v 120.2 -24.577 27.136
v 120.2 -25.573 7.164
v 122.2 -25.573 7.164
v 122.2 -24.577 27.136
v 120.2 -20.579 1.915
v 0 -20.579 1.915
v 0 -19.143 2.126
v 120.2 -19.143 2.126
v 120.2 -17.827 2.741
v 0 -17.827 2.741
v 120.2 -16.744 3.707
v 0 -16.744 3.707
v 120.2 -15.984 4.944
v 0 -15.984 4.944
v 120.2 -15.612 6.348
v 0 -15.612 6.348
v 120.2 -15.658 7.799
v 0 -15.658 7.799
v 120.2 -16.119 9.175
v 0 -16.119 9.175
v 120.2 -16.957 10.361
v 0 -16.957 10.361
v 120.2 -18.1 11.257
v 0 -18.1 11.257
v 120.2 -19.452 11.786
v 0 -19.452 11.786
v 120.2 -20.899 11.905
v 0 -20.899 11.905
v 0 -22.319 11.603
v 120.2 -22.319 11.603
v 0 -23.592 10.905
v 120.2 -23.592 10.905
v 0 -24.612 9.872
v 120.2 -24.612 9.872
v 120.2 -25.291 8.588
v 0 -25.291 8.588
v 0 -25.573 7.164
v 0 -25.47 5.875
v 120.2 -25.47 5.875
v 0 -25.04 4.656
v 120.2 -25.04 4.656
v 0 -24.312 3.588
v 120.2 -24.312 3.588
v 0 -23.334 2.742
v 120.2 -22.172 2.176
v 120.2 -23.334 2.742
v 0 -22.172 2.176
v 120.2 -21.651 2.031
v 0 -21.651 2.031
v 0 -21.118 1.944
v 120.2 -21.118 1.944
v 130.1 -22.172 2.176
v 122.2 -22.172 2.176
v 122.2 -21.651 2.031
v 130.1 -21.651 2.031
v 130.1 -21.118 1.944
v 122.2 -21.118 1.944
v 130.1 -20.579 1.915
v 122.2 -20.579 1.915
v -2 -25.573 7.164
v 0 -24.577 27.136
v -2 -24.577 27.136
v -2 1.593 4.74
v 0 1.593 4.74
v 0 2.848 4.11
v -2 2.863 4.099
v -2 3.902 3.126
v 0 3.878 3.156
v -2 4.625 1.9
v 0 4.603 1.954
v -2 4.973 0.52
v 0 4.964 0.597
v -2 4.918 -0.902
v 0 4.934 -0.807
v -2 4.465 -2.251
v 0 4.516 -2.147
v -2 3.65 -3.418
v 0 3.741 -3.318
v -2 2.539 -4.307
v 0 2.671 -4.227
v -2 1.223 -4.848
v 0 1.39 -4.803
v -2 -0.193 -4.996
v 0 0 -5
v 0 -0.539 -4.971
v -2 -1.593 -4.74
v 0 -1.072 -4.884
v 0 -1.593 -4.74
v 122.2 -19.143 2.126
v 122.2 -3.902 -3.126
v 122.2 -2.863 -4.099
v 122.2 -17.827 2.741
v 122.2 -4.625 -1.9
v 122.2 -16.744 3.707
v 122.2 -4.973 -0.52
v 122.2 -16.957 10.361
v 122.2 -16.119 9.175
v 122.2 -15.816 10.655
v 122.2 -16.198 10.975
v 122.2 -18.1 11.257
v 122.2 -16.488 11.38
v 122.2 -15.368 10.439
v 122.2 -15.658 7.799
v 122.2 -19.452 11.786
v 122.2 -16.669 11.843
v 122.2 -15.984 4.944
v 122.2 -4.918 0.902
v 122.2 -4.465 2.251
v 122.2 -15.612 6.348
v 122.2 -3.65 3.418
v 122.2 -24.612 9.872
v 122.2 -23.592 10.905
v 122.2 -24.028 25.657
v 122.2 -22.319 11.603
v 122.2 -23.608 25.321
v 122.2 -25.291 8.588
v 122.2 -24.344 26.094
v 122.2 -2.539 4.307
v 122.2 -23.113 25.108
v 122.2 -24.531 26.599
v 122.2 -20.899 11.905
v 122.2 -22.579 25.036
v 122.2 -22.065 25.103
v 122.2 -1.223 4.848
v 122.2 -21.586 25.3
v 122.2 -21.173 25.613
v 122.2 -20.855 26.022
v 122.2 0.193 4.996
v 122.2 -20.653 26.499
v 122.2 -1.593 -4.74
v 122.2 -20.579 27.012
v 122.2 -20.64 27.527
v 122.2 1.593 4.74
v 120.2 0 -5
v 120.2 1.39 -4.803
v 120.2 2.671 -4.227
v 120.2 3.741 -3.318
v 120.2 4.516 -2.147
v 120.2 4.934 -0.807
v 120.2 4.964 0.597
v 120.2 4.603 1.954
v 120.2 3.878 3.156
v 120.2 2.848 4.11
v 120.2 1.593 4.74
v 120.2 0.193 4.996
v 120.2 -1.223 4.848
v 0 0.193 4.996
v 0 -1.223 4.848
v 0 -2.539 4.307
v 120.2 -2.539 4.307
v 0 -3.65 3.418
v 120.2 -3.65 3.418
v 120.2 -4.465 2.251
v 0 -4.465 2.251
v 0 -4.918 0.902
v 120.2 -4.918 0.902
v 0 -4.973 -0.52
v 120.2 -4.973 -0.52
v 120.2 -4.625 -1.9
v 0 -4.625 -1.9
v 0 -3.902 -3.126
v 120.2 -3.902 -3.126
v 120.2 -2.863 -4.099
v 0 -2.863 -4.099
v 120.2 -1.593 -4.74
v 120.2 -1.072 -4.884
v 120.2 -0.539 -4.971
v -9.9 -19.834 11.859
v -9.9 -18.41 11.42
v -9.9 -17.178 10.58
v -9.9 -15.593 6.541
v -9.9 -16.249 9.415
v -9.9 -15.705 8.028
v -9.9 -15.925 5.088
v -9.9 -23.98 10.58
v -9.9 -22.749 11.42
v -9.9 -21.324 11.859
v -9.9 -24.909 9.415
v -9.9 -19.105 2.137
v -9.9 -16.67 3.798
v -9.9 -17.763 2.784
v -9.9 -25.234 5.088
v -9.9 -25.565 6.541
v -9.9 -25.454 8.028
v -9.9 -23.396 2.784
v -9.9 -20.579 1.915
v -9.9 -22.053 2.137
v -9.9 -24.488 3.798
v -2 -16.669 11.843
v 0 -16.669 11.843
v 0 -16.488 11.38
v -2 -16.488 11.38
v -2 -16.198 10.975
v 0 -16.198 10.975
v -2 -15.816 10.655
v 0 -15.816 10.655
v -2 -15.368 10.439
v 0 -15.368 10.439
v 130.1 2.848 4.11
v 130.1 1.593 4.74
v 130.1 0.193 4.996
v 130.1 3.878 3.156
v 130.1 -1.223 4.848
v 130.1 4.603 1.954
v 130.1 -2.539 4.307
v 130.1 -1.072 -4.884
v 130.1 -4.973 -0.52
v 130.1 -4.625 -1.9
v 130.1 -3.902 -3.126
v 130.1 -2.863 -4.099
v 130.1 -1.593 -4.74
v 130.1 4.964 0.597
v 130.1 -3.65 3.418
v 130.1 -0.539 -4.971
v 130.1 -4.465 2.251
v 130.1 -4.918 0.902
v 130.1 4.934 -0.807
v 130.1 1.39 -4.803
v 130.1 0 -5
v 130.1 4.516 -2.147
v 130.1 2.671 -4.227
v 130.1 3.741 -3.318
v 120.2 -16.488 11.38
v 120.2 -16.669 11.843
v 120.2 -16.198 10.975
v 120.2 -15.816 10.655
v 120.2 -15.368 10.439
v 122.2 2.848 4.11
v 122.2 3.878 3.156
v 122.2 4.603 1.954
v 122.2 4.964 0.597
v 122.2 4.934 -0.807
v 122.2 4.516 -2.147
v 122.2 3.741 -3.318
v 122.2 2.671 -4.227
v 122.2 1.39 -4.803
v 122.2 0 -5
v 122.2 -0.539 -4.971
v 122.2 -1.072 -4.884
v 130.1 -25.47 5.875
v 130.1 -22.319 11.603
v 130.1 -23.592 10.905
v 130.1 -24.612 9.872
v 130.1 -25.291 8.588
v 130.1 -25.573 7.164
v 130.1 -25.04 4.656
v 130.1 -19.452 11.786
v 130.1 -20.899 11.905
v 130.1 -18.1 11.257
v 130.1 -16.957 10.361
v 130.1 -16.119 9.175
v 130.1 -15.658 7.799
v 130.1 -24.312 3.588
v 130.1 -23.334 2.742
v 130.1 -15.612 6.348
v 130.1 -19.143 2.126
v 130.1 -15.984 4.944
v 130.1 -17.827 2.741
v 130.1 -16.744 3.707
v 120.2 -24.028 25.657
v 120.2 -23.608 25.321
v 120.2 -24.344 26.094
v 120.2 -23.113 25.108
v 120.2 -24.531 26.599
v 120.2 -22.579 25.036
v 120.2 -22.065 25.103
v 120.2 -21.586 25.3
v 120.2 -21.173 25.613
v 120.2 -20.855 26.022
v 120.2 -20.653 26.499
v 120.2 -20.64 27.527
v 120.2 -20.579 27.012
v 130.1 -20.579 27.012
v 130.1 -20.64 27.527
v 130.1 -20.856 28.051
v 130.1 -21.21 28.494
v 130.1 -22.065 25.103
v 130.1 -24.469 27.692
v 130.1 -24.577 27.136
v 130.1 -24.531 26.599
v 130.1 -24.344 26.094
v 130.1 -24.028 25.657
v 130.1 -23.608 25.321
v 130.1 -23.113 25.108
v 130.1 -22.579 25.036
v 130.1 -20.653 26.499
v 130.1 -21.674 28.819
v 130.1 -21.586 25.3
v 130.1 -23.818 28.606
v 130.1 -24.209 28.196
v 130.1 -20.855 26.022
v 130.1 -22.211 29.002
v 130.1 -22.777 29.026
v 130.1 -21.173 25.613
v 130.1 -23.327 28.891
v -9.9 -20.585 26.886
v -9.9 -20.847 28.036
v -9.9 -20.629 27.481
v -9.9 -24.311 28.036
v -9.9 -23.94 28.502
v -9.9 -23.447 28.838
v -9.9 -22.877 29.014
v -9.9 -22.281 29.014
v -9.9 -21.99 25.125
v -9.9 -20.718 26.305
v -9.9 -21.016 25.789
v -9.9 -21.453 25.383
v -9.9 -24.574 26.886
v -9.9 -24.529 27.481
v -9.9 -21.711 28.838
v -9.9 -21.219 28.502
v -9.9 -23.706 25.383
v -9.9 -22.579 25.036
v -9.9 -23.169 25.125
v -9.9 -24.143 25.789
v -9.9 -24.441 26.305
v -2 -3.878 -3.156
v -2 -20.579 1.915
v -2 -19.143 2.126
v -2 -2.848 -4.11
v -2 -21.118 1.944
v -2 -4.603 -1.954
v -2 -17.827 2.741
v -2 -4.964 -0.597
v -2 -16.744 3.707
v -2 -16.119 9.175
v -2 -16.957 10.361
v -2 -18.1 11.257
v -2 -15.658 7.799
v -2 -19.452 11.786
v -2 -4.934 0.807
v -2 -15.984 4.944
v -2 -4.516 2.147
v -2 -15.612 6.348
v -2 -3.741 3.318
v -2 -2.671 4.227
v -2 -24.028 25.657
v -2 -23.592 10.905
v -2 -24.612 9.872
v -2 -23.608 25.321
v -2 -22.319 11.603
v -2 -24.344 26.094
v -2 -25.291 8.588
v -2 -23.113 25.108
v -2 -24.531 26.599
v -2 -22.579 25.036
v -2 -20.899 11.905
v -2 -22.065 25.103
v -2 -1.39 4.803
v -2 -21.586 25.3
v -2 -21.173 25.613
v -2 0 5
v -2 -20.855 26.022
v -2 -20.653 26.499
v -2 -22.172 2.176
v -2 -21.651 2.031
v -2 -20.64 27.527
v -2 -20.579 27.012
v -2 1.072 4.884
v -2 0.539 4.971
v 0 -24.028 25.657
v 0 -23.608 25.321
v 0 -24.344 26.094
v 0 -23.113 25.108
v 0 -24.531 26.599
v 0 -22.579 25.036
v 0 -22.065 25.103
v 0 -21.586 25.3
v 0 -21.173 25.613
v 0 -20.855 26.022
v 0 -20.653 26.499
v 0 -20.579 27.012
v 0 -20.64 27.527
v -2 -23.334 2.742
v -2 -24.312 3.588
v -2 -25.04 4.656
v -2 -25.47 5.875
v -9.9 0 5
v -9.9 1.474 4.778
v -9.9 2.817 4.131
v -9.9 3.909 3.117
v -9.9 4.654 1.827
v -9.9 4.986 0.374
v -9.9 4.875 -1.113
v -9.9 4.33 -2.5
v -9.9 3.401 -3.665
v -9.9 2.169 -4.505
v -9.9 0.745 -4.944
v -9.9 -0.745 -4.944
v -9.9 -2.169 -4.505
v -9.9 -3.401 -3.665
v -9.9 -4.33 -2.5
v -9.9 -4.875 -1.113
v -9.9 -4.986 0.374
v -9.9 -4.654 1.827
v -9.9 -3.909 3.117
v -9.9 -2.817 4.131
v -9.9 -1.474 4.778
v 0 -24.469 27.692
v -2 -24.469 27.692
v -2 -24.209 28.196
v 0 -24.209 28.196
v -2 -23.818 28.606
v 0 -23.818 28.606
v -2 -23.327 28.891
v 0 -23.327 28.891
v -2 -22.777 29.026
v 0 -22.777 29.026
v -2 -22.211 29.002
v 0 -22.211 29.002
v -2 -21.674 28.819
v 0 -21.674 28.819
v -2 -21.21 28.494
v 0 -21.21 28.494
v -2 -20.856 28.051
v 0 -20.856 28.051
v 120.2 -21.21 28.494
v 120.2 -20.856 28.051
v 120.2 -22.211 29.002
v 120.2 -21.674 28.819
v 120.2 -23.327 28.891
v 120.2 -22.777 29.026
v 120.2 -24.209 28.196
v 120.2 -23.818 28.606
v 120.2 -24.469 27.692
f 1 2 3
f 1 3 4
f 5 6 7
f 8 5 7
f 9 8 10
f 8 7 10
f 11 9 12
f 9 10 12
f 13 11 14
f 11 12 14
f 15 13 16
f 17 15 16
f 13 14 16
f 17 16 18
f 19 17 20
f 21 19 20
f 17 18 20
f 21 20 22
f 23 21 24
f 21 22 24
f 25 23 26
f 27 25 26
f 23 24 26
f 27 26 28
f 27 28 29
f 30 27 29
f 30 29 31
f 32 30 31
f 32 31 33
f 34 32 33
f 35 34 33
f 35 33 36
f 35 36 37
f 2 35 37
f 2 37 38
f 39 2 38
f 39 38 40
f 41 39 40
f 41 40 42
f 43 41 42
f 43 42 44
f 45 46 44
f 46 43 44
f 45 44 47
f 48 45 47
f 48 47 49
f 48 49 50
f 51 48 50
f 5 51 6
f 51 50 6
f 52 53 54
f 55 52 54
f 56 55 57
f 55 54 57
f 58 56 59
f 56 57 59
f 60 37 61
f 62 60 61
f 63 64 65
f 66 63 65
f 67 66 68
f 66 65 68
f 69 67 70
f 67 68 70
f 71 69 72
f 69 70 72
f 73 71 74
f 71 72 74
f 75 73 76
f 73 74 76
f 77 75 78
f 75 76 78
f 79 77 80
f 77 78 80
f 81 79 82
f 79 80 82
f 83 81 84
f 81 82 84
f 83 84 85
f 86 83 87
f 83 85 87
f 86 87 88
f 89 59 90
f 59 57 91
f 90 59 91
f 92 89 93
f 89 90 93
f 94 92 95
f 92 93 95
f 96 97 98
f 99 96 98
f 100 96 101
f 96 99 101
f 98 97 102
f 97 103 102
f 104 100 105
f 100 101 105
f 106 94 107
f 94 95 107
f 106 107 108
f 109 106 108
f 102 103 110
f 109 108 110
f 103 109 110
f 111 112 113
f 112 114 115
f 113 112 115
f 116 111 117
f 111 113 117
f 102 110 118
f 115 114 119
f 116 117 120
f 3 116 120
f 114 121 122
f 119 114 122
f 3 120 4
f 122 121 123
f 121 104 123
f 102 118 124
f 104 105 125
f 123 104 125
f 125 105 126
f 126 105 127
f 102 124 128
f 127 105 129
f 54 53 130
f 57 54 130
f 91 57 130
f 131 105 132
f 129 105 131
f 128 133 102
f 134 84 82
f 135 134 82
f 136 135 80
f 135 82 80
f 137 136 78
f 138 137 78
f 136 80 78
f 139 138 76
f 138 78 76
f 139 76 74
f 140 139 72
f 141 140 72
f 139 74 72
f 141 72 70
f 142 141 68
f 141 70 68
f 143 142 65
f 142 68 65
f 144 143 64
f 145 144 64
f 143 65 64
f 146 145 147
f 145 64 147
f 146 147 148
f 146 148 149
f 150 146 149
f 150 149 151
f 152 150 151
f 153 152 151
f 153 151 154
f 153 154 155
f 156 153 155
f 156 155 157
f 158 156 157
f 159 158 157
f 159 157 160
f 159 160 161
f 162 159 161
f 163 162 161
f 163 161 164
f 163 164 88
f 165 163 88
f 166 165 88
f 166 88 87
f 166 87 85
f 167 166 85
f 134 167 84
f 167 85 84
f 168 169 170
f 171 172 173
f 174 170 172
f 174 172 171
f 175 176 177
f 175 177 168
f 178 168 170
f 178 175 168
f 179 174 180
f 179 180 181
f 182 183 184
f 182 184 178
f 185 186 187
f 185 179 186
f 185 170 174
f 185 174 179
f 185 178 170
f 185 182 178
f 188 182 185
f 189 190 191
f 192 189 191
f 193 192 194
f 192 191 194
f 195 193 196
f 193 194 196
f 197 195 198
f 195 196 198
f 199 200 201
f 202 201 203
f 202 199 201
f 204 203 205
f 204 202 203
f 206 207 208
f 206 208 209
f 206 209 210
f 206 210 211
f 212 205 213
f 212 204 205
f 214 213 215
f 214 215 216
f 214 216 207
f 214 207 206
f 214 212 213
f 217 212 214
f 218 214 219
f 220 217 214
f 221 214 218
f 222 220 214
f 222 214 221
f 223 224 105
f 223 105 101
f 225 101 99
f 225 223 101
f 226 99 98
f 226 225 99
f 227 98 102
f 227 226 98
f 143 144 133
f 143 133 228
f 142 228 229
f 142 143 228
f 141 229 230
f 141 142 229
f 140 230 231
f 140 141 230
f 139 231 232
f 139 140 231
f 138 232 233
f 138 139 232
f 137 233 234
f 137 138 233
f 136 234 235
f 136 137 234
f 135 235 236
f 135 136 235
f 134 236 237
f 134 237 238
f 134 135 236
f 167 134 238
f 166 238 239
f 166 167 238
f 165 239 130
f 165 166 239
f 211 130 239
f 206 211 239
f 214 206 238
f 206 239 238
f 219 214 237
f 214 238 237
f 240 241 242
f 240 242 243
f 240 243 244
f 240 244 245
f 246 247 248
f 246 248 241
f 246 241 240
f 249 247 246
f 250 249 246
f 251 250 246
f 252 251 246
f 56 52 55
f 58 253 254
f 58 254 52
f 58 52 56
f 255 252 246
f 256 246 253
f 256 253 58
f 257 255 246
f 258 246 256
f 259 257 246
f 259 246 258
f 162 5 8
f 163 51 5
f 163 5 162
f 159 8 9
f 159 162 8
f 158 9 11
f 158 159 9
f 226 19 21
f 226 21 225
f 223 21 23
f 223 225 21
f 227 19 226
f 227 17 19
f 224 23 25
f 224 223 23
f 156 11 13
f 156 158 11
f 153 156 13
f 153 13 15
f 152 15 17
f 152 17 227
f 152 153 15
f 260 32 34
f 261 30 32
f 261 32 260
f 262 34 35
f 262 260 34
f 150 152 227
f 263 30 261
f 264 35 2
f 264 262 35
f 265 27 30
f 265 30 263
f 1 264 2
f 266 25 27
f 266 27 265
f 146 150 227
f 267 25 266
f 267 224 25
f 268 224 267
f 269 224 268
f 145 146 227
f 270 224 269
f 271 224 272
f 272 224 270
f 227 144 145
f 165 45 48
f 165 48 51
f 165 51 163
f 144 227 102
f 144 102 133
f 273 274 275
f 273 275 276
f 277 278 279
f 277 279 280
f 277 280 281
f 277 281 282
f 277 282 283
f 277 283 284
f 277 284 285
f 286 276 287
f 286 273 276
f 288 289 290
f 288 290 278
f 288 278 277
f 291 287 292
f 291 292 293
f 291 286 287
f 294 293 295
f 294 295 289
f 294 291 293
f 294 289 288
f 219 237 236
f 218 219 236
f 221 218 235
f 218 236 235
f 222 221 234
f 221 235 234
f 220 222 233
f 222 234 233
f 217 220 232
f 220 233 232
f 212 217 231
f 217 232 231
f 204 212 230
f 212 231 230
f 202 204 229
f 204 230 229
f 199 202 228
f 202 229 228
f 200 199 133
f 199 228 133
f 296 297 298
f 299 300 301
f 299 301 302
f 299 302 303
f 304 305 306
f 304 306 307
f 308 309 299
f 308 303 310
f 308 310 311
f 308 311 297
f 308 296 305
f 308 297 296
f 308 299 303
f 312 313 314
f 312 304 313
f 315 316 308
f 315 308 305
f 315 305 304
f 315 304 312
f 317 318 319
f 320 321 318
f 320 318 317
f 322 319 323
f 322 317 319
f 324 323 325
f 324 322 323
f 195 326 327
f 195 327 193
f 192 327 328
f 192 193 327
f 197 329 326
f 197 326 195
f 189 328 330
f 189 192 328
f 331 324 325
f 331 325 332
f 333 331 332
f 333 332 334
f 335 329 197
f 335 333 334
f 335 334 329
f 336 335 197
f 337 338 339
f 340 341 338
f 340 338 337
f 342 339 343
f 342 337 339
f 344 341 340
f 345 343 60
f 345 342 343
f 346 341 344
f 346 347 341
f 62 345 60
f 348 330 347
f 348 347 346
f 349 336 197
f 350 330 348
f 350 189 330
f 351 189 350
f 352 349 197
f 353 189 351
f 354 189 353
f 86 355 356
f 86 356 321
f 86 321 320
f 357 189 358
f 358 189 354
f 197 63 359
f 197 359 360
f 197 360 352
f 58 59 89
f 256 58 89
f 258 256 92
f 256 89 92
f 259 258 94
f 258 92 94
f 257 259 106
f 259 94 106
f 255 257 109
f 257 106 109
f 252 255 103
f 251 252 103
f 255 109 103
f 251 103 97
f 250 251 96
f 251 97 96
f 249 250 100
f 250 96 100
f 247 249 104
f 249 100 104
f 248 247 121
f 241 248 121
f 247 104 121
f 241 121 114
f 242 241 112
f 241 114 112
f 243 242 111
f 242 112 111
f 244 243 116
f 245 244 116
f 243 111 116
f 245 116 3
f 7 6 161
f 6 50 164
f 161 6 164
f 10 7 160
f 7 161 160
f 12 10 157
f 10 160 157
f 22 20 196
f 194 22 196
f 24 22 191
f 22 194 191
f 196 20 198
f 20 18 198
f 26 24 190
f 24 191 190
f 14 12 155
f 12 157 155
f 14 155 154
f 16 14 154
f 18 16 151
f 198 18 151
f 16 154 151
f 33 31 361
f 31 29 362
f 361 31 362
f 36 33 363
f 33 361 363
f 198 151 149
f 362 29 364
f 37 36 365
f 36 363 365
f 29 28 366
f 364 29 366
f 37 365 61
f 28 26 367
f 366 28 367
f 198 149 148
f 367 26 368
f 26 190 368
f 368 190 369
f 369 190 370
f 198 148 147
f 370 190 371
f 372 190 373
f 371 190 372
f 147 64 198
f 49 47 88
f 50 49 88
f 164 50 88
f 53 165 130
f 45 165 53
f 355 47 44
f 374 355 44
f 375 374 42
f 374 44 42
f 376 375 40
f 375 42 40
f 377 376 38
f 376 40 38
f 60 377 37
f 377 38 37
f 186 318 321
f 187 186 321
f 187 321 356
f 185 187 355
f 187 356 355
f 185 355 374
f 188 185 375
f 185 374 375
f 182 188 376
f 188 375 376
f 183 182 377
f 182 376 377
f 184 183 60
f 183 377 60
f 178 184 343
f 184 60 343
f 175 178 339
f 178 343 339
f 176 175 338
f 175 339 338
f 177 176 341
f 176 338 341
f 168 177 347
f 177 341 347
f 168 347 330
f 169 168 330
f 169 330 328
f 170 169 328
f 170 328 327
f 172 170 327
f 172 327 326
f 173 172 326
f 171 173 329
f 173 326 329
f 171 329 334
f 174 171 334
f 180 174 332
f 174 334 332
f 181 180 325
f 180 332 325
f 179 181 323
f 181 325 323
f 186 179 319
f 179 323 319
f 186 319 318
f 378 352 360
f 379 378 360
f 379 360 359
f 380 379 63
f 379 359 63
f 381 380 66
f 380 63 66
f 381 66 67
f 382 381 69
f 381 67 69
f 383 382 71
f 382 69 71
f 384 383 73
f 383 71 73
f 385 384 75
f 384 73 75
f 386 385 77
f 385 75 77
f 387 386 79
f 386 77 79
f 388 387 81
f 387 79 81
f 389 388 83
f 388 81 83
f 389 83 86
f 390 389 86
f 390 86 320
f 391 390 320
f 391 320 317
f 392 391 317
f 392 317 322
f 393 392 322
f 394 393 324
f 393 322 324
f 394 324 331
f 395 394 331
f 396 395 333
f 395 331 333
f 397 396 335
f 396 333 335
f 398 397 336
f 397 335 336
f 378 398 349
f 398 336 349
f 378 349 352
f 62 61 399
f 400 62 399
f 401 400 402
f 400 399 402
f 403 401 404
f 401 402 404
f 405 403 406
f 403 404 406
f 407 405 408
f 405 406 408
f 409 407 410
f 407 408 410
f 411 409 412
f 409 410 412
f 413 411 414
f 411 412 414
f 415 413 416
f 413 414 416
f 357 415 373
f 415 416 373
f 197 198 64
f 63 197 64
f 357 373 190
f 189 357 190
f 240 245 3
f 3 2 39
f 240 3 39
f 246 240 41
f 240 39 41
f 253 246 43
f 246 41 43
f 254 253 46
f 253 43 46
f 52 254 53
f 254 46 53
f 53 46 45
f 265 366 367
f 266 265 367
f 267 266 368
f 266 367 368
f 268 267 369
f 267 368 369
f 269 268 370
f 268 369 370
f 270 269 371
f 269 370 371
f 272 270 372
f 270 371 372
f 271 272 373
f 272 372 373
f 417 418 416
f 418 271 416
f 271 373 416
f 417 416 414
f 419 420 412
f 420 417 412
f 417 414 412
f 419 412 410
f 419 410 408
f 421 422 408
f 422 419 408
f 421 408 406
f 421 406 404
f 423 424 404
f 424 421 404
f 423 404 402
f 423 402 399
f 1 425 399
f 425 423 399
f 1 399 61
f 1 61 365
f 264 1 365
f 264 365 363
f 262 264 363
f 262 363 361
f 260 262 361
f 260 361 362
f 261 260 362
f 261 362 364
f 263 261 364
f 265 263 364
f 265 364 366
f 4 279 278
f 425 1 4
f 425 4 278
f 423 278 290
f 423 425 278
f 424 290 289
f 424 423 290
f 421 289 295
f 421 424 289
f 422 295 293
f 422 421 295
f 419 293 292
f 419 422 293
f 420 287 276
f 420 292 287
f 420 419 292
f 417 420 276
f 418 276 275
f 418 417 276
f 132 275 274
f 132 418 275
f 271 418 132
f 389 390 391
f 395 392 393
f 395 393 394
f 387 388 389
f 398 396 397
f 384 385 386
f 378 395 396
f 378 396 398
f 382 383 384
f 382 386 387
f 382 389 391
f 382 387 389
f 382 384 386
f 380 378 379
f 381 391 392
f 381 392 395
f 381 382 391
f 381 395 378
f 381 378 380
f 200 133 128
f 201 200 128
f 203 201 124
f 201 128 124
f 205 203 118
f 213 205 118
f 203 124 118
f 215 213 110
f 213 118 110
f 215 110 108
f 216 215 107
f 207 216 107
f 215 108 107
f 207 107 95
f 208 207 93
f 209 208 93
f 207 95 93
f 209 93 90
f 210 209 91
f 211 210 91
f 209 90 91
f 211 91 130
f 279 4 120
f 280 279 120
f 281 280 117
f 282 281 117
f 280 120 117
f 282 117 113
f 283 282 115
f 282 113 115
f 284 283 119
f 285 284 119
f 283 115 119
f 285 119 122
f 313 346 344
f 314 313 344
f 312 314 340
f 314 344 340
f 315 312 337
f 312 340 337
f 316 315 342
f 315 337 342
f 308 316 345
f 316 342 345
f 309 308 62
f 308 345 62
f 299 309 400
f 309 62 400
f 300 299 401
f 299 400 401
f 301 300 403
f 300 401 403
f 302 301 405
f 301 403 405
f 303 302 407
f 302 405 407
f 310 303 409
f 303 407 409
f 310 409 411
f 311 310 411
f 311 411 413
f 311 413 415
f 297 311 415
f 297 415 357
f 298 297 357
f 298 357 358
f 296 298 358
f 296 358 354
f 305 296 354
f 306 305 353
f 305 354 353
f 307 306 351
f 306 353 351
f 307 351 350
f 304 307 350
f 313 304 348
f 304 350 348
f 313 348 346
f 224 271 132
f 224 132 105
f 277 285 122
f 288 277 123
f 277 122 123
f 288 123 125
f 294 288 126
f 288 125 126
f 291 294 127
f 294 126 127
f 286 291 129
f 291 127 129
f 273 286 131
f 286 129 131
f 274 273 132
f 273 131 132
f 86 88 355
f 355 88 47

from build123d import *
from build123d.topology import SkipClean

# Parameters (mm, degrees)
CROQUIS1_R                = 5
SALIENTE_EXTRUIR6_DEPTH   = 120.2
SALIENTE_EXTRUIR6_2_DEPTH = 120.2
CROQUIS1_R_2              = 2
SALIENTE_EXTRUIR6_3_DEPTH = 120.2
SALIENTE_EXTRUIR8_DEPTH   = 2
SALIENTE_EXTRUIR9_DEPTH   = 2
SALIENTE_EXTRUIR10_DEPTH  = 7.9
CROQUIS14_R               = 5
CROQUIS14_R_2             = 2
SALIENTE_EXTRUIR11_DEPTH  = 7.9


with BuildPart() as part:
    # Croquis1 → Saliente-Extruir6 (new body)
    with BuildSketch(Plane(origin=(0, 0, 0), x_dir=(0, 0, -1), z_dir=(1, 0, 0))):
        Circle(CROQUIS1_R)
    extrude(amount=SALIENTE_EXTRUIR6_DEPTH)



with BuildPart() as body_2:
    # Croquis1 → Saliente-Extruir6 2 (new body)
    with BuildSketch(Plane(origin=(0, 0, 0), x_dir=(0, 0, -1), z_dir=(1, 0, 0))):
        with Locations((-6.915082, -20.579255)):
            Circle(CROQUIS1_R)
    extrude(amount=SALIENTE_EXTRUIR6_2_DEPTH)


with BuildPart() as body_3:
    # Croquis1 → Saliente-Extruir6 3 (new body)
    with BuildSketch(Plane(origin=(0, 0, 0), x_dir=(0, 0, -1), z_dir=(1, 0, 0))):
        with Locations((-27.035927, -22.579255)):
            Circle(CROQUIS1_R_2)
    extrude(amount=SALIENTE_EXTRUIR6_3_DEPTH)


with BuildPart() as part_1:
    with SkipClean():  # the faces are left unmerged after this step: merging them gives an invalid solid
        add(part.part)

        add(body_2.part)  # Saliente-Extruir8 merges body 2

        add(body_3.part)  # Saliente-Extruir8 merges body 3
        # Croquis10 → Saliente-Extruir8 (add)
        with BuildSketch(Plane.ZY):
            with BuildLine():
                Line((-4.73958, -1.592603), (2.175502, -22.171858))
                ThreePointArc((2.175502, -22.171858), (4.098509, -24.710467), (7.164198, -25.573045))
                Line((7.164198, -25.573045), (27.135573, -24.576771))
                ThreePointArc((27.135573, -24.576771), (29.026119, -22.777079), (27.526842, -20.64044))
                Line((27.526842, -20.64044), (11.843492, -16.669357))
                ThreePointArc((11.843492, -16.669357), (10.975071, -16.197582), (10.438575, -15.367583))
                Line((10.438575, -15.367583), (4.73958, 1.592603))
                ThreePointArc((4.73958, 1.592603), (-1.592603, 4.73958), (-4.73958, -1.592603))
            make_face()
        extrude(amount=SALIENTE_EXTRUIR8_DEPTH)

    # Croquis11 → Saliente-Extruir9 (add)
    with BuildSketch(Plane(origin=(120.2, 0, 0), x_dir=(0, 0, -1), z_dir=(1, 0, 0))):
        with BuildLine():
            Line((4.73958, -1.592603), (-2.175502, -22.171858))
            ThreePointArc((-2.175502, -22.171858), (-4.098509, -24.710467), (-7.164198, -25.573045))
            Line((-7.164198, -25.573045), (-27.135573, -24.576771))
            ThreePointArc((-27.135573, -24.576771), (-29.026119, -22.777079), (-27.526842, -20.64044))
            Line((-27.526842, -20.64044), (-11.843492, -16.669357))
            ThreePointArc((-11.843492, -16.669357), (-10.975071, -16.197582), (-10.438575, -15.367583))
            Line((-10.438575, -15.367583), (-4.73958, 1.592603))
            ThreePointArc((-4.73958, 1.592603), (1.592603, 4.73958), (4.73958, -1.592603))
        make_face()
    extrude(amount=SALIENTE_EXTRUIR9_DEPTH)

    # Croquis13 → Saliente-Extruir10 (add)
    with BuildSketch(Plane(origin=(122.2, 0, 0), x_dir=(0, 0, -1), z_dir=(1, 0, 0))):
        with BuildLine():
            ThreePointArc((-7.164198, -25.573045), (-4.098509, -24.710467), (-2.175502, -22.171858))
            ThreePointArc((-2.175502, -22.171858), (-1.980616, -21.386132), (-1.915082, -20.579255))
            ThreePointArc((-1.915082, -20.579255), (-10.361415, -16.956716), (-7.164198, -25.573045))
        make_face()
        with BuildLine():
            ThreePointArc((5, 0), (0.806877, 4.934465), (-4.73958, 1.592603))
            ThreePointArc((-4.73958, 1.592603), (-1.592603, -4.73958), (4.73958, -1.592603))
            ThreePointArc((4.73958, -1.592603), (4.934465, -0.806877), (5, 0))
        make_face()
        with BuildLine():
            ThreePointArc((-25.035927, -22.579255), (-25.807479, -21.000992), (-27.526842, -20.64044))
            ThreePointArc((-27.526842, -20.64044), (-29.026119, -22.777079), (-27.135573, -24.576771))
            ThreePointArc((-27.135573, -24.576771), (-25.657394, -24.028271), (-25.035927, -22.579255))
        make_face()
    extrude(amount=SALIENTE_EXTRUIR10_DEPTH)

    # Croquis14 → Saliente-Extruir11 (add)
    with BuildSketch(Plane.ZY.offset(2)):
        Circle(CROQUIS14_R)
        with Locations(Location((27.035927, -22.579255, 0), (0, 0, 180))):
            Circle(CROQUIS14_R_2)
        with Locations(Location((6.915082, -20.579255, 0), (0, 0, 180))):
            Circle(CROQUIS14_R)
    extrude(amount=SALIENTE_EXTRUIR11_DEPTH)


solid = part_1.part
